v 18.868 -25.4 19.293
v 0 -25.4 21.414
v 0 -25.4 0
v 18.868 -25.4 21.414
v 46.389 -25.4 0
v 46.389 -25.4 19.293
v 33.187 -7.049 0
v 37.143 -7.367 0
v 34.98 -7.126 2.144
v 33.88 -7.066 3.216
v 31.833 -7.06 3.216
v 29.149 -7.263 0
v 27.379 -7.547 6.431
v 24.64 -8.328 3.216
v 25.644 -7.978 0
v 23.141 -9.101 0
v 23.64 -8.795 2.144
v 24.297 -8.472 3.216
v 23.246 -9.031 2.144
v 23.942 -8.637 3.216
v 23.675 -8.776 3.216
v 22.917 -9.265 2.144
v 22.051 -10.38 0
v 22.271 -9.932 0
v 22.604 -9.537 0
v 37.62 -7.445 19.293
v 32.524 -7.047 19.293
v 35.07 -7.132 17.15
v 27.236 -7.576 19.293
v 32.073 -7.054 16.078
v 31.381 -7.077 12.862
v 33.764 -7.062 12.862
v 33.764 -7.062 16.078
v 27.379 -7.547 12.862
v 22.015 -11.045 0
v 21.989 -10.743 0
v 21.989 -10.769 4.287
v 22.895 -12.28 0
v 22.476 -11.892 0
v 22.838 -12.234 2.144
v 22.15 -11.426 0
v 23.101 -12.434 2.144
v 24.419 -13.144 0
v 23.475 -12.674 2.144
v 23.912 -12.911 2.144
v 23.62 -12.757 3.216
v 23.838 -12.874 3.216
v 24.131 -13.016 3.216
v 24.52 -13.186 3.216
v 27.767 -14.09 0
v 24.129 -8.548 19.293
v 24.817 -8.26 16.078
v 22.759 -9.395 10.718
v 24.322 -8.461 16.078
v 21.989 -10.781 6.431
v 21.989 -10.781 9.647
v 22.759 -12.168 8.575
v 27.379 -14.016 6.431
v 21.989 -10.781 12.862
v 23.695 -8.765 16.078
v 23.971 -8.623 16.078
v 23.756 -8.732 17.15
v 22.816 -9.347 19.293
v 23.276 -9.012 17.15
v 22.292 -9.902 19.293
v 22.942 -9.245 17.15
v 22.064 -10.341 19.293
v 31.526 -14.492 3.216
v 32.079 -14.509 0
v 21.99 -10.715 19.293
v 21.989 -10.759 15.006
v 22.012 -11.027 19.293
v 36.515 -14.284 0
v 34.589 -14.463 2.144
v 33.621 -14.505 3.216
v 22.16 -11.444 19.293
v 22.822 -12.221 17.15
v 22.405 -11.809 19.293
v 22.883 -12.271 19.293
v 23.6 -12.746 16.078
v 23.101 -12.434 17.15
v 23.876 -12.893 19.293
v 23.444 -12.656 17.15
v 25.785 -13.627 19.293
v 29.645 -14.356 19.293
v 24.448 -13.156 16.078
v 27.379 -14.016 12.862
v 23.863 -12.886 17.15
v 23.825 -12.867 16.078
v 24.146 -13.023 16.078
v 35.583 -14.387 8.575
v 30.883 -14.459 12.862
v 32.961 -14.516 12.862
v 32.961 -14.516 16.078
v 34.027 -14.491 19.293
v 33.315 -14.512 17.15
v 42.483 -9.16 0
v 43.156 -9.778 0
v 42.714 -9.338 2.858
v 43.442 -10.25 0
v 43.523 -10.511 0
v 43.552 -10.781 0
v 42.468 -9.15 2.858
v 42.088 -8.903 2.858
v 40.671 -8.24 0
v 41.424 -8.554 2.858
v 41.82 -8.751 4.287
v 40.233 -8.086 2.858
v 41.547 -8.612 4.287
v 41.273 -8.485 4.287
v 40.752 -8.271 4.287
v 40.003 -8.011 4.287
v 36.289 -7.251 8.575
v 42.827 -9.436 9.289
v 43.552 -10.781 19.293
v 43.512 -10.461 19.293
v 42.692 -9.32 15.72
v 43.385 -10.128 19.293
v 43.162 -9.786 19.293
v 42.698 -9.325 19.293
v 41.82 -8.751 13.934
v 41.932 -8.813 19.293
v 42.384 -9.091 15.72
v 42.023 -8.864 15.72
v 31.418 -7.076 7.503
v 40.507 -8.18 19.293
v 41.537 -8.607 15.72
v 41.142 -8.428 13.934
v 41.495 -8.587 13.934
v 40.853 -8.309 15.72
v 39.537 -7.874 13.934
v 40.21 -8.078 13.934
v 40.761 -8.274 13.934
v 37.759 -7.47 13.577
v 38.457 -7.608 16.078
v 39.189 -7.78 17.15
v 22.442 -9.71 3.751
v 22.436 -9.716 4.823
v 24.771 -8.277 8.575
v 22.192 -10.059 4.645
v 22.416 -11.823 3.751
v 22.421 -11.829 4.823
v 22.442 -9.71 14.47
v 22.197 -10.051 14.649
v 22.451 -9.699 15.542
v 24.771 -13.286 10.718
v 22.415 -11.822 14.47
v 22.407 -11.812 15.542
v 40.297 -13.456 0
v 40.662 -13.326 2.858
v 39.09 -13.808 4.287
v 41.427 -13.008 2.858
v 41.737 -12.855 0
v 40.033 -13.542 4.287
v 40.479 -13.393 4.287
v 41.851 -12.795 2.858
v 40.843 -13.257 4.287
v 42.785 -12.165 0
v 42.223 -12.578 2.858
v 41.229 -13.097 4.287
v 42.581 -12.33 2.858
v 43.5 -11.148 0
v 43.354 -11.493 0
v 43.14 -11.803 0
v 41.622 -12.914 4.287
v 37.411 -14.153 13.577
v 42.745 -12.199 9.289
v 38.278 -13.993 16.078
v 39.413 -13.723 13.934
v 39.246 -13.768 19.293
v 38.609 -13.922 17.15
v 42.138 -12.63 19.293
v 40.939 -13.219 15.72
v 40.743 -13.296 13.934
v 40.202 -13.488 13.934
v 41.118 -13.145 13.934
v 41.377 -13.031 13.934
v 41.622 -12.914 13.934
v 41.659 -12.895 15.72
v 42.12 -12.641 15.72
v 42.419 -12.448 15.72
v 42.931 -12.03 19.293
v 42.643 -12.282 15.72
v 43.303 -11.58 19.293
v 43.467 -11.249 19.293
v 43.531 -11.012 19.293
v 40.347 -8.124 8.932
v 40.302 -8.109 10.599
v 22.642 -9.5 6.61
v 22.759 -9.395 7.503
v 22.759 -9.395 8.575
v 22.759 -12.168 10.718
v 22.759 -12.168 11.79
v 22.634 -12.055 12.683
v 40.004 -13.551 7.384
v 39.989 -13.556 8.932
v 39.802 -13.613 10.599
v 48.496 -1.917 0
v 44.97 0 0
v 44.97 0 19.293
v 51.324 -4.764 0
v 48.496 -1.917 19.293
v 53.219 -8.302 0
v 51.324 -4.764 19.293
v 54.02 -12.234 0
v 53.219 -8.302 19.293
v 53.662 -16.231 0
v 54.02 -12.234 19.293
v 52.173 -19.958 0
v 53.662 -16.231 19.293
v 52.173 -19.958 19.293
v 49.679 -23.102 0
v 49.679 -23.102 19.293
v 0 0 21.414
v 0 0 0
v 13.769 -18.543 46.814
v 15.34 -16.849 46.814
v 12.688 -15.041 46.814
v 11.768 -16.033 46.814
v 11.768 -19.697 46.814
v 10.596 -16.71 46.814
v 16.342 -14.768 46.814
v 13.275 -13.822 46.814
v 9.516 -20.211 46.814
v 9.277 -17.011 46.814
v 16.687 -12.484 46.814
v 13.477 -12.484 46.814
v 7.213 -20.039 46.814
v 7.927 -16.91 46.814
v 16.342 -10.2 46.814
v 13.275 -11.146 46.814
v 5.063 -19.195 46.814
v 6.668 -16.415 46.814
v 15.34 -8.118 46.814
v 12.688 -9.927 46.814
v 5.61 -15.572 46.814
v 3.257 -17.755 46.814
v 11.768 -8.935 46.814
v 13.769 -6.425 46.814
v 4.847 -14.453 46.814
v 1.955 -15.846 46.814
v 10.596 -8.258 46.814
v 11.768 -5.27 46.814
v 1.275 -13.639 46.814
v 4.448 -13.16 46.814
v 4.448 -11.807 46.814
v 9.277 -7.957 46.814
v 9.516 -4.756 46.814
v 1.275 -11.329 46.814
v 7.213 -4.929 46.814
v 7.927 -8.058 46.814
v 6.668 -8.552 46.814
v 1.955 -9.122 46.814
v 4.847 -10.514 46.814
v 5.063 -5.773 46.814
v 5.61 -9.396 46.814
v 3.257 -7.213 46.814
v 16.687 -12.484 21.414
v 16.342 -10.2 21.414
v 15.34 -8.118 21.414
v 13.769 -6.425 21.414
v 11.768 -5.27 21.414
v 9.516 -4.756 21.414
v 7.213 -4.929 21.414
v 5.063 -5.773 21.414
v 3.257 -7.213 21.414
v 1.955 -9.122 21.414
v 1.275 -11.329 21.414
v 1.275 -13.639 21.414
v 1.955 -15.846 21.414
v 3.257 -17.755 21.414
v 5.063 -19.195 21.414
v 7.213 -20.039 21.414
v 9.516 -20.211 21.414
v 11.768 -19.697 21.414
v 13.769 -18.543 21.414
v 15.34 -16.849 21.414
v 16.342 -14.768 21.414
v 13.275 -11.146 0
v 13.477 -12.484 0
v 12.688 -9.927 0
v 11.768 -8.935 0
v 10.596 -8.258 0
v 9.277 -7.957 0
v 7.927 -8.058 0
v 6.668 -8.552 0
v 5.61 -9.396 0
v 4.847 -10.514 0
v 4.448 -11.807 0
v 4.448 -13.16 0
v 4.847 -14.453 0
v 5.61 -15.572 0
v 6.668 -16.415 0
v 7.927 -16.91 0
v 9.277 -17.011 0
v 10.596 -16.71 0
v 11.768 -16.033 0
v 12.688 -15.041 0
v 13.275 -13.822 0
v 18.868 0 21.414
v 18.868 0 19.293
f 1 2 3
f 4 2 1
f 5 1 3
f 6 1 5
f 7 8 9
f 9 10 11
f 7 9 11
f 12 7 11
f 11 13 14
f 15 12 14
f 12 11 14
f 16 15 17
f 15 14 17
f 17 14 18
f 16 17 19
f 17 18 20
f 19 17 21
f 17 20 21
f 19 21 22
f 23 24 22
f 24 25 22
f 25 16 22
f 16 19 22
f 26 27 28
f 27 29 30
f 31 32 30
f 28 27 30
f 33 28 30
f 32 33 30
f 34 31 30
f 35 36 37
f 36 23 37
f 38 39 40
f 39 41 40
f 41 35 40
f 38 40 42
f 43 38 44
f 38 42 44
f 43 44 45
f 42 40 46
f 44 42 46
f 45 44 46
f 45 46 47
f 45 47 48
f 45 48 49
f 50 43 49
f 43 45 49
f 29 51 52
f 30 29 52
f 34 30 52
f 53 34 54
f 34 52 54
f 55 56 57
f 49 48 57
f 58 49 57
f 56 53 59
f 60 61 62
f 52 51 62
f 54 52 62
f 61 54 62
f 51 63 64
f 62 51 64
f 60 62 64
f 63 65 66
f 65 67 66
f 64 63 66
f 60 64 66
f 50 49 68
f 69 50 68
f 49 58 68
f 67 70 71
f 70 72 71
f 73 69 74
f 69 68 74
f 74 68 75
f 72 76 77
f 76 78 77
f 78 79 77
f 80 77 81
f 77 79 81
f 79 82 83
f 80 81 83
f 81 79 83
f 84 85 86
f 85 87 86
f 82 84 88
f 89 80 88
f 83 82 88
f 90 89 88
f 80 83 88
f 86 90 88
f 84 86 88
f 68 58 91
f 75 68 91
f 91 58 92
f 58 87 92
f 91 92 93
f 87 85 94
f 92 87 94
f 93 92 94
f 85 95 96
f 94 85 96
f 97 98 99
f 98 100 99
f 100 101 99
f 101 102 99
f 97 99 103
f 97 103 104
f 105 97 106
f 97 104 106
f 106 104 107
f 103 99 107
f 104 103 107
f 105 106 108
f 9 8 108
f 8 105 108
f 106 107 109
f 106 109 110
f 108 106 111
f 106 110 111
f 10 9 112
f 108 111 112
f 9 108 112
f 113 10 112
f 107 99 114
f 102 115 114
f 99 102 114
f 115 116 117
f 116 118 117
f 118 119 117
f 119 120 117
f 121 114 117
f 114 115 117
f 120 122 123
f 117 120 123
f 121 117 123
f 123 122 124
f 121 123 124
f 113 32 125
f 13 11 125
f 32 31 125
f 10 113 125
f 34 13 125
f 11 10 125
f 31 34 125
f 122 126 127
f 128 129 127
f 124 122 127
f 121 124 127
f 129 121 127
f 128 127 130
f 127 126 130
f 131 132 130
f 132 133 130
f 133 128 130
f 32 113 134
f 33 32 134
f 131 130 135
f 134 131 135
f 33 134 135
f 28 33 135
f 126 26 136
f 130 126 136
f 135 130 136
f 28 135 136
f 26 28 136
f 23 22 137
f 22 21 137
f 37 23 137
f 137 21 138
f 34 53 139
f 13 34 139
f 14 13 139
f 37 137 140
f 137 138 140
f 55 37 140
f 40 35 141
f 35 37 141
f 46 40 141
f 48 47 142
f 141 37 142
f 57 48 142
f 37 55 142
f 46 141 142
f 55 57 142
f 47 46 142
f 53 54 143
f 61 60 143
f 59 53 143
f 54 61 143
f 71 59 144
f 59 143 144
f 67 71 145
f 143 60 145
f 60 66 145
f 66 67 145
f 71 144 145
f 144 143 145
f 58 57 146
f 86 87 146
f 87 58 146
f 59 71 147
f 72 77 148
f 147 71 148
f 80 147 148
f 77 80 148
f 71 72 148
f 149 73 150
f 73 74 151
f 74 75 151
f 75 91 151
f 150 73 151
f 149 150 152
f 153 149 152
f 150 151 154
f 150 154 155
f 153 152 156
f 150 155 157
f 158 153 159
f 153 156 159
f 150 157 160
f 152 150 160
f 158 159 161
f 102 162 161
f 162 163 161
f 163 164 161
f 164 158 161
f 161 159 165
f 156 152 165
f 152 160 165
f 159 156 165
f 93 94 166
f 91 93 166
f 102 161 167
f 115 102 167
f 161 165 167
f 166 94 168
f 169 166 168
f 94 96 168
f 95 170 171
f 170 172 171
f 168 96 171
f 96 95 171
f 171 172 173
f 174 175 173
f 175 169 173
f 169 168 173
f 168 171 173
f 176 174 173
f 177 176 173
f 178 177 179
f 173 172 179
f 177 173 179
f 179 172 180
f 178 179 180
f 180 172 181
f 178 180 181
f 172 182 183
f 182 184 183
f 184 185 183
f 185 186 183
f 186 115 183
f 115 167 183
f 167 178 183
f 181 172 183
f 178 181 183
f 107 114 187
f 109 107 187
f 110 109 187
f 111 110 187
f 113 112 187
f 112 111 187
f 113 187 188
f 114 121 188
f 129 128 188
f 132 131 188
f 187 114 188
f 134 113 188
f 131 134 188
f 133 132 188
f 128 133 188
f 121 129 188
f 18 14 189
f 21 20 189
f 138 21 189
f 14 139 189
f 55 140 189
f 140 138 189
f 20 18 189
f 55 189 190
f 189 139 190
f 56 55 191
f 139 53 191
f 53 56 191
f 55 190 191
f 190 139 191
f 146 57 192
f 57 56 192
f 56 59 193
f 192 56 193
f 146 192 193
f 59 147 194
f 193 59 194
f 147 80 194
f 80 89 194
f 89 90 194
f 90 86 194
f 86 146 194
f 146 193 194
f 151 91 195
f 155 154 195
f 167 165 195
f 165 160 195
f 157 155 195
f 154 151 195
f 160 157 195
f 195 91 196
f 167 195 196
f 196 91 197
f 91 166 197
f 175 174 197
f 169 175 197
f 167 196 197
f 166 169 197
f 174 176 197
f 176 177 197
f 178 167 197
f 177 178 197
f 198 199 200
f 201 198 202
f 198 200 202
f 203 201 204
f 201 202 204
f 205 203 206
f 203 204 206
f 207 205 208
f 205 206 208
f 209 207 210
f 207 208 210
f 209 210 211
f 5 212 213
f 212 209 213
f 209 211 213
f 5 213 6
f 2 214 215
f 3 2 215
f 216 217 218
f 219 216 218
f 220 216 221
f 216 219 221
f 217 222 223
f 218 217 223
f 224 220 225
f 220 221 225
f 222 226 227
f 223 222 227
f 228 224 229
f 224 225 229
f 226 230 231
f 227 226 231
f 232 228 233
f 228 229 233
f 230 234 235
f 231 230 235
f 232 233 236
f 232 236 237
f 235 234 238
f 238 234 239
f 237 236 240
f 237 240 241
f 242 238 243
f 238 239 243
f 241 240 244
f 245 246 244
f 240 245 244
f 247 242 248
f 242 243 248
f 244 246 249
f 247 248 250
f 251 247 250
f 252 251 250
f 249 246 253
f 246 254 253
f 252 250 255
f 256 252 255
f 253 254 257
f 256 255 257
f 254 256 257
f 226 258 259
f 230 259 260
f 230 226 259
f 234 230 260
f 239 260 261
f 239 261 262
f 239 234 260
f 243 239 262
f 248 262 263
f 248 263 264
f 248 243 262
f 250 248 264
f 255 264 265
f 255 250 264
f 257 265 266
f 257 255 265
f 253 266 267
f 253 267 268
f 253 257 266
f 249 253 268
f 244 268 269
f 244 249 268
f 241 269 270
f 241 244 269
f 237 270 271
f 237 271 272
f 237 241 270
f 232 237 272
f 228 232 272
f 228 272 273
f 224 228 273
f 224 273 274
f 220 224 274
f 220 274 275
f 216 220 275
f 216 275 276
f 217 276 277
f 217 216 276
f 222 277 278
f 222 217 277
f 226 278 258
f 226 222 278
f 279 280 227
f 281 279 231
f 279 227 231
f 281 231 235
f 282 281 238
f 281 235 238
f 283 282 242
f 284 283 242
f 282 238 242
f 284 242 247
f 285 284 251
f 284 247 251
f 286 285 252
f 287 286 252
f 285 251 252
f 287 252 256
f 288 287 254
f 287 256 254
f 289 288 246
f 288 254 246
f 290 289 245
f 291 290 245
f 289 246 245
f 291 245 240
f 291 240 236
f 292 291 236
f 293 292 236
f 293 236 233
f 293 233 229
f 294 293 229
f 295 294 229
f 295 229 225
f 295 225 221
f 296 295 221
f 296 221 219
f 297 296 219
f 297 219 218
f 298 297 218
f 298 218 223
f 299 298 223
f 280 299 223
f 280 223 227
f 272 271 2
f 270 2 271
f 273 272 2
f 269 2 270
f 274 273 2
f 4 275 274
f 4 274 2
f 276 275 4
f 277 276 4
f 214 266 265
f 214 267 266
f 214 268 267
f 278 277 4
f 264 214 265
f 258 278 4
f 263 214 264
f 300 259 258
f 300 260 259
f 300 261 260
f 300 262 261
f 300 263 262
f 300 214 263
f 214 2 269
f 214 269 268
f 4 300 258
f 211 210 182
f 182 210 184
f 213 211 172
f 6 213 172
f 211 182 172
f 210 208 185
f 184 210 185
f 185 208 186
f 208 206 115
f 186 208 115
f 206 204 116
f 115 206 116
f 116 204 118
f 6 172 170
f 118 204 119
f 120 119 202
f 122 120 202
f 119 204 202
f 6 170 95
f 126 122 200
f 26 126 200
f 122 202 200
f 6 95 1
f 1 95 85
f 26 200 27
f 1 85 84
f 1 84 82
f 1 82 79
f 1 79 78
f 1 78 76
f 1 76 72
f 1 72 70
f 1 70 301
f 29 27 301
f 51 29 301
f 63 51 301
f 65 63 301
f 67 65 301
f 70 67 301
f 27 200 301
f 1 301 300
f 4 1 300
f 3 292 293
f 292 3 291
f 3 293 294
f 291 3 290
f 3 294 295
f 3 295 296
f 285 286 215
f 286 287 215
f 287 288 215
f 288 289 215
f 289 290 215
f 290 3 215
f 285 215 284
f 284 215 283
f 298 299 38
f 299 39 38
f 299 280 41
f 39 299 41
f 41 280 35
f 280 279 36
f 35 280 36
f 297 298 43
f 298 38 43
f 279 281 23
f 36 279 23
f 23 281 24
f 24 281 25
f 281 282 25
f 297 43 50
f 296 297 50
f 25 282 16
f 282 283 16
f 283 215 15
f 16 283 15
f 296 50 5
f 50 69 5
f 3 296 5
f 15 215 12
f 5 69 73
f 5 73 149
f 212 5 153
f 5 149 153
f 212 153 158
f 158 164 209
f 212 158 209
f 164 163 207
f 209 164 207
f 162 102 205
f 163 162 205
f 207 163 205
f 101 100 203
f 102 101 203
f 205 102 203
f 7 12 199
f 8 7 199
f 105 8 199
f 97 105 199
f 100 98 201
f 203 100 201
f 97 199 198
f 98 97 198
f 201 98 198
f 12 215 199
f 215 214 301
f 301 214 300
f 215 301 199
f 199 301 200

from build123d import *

# Parameters (mm, degrees)
F1_DEPTH = 25.4
F2_W     = 18.867608
F2_H     = 25.4
F2_R     = 7.749335
F3_DEPTH = 25.4
F5_DEPTH = 25.4
F7_DEPTH = 25.4
F8_R     = 4.539573
F9_DEPTH = 50.8


with BuildPart() as f1:
    # F0 (on Front) → F1 (new body)
    with BuildSketch(Plane.XZ):
        Polygon((0, 46.81436), (0, 0), (55.1842, 0), (55.1842, 19.293191), (18.867608, 19.293191), (18.867608, 46.81436), align=None)
    extrude(amount=F1_DEPTH)

    # F2 (on face) → F3 (cut)
    with BuildSketch(Plane.XY.offset(46.81436)):
        with Locations((9.433804, -12.7)):
            Rectangle(F2_W, F2_H)
        with Locations((8.937289, -12.483831)):
            Circle(F2_R, mode=Mode.SUBTRACT)
    extrude(amount=-F3_DEPTH, mode=Mode.SUBTRACT)

    # F4 (on face) → F5 (cut)
    with BuildSketch(Plane.XY.offset(19.293191)):
        with BuildLine():
            ThreePointArc((44.970158, 0), (54.020374, -12.23415), (46.388779, -25.4))
            Line((46.388779, -25.4), (55.1842, -25.4))
            Line((55.1842, -25.4), (55.1842, 0))
            Line((55.1842, 0), (44.970158, 0))
        make_face()
    extrude(amount=-F5_DEPTH, mode=Mode.SUBTRACT)

    # F6 (on face) → F7 (cut)
    with BuildSketch(Plane.XY.offset(19.293191)):
        with BuildLine():
            add(Edge.make_bspline(
                [(43.551542, -10.781489), (43.551542, -4.311831), (27.379308, -7.54666), (11.207074, -10.781489), (27.379308, -14.016319), (43.551542, -17.251148), (43.551542, -10.781489)],
                knots=[0, 0, 0, 2.094395, 2.094395, 4.18879, 4.18879, 6.283185, 6.283185, 6.283185], degree=2, weights=[1, 0.5, 1, 0.5, 1, 0.5, 1]))
        make_face()
    extrude(amount=-F7_DEPTH, mode=Mode.SUBTRACT)

    # F8 (on face) → F9 (cut)
    with BuildSketch(Plane.XY.offset(46.81436)):
        with Locations((8.937289, -12.483831)):
            Circle(F8_R)
    extrude(amount=-F9_DEPTH, mode=Mode.SUBTRACT)


solid = f1.part
